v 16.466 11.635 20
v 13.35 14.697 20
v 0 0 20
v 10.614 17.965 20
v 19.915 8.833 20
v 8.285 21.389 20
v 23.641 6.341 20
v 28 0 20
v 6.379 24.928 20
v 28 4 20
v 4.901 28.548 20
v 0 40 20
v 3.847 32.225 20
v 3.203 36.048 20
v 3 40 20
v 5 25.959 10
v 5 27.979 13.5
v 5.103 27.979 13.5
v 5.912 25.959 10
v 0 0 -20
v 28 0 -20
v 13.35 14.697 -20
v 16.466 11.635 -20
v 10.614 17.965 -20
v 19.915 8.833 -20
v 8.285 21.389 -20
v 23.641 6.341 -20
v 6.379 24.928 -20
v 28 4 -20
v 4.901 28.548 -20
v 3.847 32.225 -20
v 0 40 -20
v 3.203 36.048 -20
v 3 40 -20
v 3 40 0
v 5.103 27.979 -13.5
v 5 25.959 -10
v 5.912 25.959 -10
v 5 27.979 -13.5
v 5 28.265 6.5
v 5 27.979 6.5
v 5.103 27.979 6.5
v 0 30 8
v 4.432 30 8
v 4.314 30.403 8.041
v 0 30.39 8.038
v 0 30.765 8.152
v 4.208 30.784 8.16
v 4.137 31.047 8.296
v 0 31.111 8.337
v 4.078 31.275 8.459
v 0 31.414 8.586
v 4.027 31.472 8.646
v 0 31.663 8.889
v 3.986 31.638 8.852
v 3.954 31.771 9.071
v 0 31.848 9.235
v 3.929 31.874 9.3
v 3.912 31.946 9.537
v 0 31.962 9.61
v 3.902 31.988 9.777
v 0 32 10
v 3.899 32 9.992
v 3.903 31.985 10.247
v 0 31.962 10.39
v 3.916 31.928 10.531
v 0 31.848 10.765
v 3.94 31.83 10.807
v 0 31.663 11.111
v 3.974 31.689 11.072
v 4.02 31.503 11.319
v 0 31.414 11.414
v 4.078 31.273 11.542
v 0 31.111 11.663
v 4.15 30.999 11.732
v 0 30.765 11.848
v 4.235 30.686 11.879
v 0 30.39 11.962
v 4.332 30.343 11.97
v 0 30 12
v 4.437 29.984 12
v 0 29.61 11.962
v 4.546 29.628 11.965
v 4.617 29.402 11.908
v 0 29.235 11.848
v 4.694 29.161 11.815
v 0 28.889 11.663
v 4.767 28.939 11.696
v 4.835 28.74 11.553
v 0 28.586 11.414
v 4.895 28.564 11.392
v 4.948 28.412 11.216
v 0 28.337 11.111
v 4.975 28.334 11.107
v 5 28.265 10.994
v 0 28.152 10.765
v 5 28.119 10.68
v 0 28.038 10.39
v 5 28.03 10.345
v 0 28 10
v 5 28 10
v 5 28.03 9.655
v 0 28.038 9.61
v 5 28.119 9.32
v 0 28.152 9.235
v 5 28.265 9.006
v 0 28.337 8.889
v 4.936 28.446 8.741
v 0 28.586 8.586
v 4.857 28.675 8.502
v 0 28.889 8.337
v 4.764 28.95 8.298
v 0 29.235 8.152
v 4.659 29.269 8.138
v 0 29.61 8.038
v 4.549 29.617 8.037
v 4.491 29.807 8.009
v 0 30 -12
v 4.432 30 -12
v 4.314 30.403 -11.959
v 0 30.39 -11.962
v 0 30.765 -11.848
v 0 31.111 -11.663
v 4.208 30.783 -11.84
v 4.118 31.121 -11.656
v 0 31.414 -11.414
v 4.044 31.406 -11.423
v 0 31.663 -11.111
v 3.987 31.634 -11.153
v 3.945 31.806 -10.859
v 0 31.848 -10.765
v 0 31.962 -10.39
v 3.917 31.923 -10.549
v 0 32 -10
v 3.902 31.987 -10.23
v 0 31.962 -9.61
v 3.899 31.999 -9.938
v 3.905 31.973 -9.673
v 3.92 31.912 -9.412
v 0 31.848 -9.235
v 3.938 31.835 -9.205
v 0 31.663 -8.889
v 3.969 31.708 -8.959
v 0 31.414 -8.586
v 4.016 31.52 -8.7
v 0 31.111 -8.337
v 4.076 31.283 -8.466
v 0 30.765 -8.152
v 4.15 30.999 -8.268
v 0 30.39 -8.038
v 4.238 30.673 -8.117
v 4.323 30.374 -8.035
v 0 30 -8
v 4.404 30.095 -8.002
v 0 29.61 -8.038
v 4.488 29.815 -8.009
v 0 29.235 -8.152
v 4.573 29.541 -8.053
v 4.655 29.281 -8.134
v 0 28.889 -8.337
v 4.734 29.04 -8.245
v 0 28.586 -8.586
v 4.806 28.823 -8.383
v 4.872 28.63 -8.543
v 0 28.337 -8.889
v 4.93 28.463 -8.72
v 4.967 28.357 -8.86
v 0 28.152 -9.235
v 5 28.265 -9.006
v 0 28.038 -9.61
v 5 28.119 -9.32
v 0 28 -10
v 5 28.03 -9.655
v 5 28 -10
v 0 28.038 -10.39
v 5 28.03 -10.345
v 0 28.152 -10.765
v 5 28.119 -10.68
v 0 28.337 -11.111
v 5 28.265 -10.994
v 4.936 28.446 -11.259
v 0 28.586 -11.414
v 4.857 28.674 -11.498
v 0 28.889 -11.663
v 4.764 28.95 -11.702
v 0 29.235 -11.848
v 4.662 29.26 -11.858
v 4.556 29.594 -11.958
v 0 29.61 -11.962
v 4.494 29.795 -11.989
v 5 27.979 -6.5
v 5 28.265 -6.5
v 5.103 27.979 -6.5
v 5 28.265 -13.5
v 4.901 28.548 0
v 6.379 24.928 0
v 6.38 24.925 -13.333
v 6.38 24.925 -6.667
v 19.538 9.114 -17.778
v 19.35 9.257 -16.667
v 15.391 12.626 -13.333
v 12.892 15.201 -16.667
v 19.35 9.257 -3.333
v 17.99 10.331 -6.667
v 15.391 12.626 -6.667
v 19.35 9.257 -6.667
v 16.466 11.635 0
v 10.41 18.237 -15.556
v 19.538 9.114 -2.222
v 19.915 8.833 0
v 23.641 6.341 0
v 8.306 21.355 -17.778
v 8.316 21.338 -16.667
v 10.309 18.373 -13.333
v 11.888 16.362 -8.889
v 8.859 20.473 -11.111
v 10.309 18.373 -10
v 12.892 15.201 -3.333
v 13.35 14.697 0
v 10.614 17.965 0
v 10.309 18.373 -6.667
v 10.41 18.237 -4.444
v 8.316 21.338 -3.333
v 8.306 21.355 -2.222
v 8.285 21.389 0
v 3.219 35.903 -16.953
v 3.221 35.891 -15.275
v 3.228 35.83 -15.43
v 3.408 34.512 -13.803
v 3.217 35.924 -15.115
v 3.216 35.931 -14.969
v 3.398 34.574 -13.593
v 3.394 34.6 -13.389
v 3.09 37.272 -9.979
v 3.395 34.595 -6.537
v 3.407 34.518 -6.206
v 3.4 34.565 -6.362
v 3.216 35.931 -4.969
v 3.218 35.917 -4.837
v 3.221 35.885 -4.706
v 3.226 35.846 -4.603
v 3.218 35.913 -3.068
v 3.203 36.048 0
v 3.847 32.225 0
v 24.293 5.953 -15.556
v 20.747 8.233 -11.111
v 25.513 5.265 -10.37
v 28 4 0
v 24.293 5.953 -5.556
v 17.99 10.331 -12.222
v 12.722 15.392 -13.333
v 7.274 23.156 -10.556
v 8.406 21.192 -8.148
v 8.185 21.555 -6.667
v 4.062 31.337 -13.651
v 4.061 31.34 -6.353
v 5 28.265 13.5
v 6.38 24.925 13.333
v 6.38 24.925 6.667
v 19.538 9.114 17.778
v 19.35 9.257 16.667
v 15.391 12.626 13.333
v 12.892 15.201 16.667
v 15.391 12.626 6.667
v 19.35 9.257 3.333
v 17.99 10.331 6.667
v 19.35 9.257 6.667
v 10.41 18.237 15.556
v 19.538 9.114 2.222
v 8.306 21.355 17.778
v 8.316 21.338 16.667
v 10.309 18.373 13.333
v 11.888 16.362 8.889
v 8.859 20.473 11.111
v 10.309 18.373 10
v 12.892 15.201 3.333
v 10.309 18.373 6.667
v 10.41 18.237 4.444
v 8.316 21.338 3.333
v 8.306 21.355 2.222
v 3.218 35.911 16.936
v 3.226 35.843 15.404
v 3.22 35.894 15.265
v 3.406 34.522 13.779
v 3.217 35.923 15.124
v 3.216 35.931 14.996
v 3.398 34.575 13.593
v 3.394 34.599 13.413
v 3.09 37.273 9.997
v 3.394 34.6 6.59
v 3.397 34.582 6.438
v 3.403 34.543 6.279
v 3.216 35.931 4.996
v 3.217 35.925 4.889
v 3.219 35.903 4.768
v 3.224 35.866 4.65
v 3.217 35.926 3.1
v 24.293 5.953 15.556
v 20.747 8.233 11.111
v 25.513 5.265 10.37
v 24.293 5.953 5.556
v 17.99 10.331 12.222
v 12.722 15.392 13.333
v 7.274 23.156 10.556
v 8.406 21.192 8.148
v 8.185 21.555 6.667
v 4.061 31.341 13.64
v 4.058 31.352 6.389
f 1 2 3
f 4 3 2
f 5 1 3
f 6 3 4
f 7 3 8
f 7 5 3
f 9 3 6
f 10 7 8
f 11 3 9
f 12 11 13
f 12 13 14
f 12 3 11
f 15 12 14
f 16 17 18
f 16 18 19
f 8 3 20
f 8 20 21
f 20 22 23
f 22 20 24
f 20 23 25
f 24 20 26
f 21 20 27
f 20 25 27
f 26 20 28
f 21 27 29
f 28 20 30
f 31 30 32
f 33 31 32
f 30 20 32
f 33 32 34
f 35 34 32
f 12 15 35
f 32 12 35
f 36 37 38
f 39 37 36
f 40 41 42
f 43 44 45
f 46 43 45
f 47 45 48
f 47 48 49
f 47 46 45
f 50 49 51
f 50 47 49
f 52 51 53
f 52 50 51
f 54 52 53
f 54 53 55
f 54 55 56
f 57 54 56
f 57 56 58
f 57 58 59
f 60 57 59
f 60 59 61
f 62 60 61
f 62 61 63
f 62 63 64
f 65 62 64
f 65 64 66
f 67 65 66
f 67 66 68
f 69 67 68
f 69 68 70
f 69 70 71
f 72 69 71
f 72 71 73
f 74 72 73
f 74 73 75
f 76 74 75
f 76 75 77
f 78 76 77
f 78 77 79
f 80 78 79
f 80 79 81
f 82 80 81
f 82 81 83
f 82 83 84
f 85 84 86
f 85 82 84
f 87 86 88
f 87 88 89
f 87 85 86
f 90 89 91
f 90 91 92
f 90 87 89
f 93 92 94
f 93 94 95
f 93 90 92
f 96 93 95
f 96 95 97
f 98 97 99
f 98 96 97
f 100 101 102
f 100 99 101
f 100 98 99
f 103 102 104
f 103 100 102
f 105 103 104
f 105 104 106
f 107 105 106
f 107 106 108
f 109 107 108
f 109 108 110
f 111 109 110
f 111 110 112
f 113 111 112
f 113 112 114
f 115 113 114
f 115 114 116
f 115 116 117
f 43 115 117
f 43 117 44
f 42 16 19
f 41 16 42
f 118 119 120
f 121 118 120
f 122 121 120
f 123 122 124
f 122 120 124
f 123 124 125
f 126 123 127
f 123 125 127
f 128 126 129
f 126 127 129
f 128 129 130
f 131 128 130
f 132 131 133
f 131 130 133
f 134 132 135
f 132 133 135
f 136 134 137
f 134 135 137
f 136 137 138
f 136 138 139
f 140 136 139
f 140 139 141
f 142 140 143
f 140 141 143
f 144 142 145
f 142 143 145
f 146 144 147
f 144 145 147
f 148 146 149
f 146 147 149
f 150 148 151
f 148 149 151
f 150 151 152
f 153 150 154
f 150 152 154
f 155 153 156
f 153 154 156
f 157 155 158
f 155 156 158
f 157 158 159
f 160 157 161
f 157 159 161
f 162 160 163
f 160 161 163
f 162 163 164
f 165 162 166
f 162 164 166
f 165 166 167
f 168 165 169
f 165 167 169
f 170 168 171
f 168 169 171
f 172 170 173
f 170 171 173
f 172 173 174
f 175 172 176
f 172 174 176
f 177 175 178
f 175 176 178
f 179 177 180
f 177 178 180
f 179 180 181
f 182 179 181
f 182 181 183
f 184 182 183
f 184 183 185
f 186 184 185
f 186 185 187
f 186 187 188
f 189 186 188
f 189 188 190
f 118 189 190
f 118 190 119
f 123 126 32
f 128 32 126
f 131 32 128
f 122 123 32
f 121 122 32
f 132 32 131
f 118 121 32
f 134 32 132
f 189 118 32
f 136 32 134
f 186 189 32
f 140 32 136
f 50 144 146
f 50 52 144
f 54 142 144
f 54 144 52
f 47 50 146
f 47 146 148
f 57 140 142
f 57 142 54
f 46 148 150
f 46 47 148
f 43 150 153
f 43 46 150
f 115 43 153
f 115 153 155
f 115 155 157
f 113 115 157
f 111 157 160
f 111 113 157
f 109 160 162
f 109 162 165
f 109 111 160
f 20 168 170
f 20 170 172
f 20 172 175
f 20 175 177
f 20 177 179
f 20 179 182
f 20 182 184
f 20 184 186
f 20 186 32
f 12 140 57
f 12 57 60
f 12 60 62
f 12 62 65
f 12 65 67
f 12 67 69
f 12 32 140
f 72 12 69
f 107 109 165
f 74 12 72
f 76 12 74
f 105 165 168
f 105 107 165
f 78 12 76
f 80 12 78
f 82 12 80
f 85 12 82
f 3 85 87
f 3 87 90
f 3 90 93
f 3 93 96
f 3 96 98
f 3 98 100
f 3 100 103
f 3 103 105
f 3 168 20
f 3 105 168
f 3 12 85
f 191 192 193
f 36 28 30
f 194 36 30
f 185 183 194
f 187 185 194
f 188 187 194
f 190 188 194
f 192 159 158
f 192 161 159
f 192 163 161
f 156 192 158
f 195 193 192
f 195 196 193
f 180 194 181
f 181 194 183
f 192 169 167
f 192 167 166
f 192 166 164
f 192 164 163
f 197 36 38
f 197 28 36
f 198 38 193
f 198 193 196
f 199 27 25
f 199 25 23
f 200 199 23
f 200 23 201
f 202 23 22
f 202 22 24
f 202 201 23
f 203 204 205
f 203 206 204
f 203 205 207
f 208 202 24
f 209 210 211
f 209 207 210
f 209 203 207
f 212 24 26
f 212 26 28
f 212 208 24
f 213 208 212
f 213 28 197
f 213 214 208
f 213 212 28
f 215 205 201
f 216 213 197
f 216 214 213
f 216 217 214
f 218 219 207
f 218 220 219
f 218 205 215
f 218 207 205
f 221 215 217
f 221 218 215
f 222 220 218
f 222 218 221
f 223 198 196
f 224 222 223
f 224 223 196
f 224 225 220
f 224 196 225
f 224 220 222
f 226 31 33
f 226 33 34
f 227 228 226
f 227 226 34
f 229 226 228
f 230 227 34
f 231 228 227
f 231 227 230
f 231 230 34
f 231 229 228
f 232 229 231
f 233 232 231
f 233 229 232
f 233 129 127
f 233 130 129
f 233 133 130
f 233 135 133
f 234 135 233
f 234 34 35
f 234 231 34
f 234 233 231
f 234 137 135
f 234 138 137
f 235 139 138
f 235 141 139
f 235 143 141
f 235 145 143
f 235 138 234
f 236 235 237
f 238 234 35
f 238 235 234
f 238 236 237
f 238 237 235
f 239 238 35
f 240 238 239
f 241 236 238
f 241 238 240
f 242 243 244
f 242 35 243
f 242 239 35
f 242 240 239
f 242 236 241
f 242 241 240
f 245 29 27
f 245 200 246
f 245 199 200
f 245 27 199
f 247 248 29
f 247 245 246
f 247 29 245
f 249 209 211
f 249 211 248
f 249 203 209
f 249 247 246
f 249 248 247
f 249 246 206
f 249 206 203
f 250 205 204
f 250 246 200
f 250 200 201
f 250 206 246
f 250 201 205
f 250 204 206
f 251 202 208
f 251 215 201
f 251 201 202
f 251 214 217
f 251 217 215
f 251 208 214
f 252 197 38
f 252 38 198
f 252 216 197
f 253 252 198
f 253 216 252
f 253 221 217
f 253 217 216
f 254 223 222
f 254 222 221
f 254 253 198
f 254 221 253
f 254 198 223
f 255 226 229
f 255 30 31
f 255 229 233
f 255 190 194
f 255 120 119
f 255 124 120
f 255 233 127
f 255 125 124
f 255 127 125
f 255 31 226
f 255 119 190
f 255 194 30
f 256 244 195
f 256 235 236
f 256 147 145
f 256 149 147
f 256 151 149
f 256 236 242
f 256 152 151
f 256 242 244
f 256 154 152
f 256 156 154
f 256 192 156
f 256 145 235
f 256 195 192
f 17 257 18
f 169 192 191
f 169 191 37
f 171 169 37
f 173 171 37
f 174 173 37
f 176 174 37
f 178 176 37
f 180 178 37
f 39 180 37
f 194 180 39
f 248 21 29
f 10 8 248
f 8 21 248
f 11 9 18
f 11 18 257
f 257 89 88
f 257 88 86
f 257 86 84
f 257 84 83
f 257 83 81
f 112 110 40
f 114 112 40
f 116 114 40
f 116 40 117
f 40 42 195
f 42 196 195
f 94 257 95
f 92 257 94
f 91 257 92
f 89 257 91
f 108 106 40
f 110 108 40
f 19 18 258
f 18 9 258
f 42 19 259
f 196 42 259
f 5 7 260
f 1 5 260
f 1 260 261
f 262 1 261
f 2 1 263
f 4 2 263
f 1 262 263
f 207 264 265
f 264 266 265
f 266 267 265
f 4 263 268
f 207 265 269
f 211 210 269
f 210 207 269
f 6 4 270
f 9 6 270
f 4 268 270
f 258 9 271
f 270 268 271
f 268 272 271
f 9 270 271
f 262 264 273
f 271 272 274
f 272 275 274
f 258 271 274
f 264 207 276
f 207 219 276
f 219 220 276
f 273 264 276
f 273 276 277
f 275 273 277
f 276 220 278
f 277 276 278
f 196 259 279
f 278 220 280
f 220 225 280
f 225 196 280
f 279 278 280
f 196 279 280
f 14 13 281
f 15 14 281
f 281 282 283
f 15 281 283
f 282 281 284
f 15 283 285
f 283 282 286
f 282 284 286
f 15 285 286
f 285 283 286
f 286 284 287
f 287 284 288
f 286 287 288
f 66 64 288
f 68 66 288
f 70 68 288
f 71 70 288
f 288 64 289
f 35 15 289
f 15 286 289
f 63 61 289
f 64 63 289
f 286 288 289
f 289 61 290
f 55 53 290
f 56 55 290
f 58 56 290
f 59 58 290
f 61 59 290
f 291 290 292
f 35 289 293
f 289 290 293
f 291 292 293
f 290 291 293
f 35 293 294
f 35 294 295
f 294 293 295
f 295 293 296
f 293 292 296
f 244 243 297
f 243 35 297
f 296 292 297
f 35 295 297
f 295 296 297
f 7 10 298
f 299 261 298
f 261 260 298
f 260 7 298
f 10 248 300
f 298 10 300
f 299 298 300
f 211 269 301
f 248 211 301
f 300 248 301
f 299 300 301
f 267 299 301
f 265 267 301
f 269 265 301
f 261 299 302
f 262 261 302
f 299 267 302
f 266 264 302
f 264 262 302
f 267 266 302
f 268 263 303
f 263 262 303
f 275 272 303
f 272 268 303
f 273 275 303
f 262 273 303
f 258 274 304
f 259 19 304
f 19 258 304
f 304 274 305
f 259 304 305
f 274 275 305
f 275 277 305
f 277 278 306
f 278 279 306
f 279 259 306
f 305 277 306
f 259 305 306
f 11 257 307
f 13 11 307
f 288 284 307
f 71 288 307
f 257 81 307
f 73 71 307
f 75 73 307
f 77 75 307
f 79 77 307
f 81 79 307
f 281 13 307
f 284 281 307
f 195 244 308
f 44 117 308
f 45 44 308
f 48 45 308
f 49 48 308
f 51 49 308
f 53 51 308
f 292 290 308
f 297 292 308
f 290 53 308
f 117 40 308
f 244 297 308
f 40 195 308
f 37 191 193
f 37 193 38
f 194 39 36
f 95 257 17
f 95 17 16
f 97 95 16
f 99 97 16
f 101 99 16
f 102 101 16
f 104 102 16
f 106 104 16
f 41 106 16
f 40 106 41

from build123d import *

# Parameters (mm, degrees)
EXTRUDE_1_DEPTH     = 20
SKETCH_2_R          = 2
CUT_EXTRUDE_2_DEPTH = 10
CUT_EXTRUDE_3_DEPTH = 20


with BuildPart() as part:
    # 草图1 → 凸台-拉伸1 (new, symmetric)
    with BuildSketch(Plane.XY):
        with BuildLine():
            Line((0, 40), (0, 0))
            Line((0, 0), (28, 0))
            Line((28, 0), (28, 4))
            add(Edge.make_bspline(
                [(28, 4), (14.27041689, 10.491058619), (2.887307451, 23.83674366), (3, 40)],
                knots=[0, 0, 0, 0, 1, 1, 1, 1], degree=3))
            Line((3, 40), (0, 40))
        make_face()
    extrude(amount=EXTRUDE_1_DEPTH, both=True)

    # 草图2 → 切除-拉伸2 (cut, symmetric)
    with BuildSketch(Plane(origin=(0, 0, 0), x_dir=(0, 0, -1), z_dir=(1, 0, 0))):
        with Locations((-10, 30)):
            Circle(SKETCH_2_R)
        with Locations((10, 30)):
            Circle(SKETCH_2_R)
    extrude(amount=CUT_EXTRUDE_2_DEPTH, both=True, mode=Mode.SUBTRACT)

    # 草图3 → 切除-拉伸3 (cut)
    with BuildSketch(Plane(origin=(5, 0, 0), x_dir=(0, 0, -1), z_dir=(1, 0, 0))):
        Polygon((-10, 34.041451884), (-13.5, 32.020725942), (-13.5, 27.979274058), (-10, 25.958548116), (-6.5, 27.979274058), (-6.5, 32.020725942), align=None)
        Polygon((10, 34.041451884), (6.5, 32.020725942), (6.5, 27.979274058), (10, 25.958548116), (13.5, 27.979274058), (13.5, 32.020725942), align=None)
    extrude(amount=CUT_EXTRUDE_3_DEPTH, mode=Mode.SUBTRACT)


solid = part.part
